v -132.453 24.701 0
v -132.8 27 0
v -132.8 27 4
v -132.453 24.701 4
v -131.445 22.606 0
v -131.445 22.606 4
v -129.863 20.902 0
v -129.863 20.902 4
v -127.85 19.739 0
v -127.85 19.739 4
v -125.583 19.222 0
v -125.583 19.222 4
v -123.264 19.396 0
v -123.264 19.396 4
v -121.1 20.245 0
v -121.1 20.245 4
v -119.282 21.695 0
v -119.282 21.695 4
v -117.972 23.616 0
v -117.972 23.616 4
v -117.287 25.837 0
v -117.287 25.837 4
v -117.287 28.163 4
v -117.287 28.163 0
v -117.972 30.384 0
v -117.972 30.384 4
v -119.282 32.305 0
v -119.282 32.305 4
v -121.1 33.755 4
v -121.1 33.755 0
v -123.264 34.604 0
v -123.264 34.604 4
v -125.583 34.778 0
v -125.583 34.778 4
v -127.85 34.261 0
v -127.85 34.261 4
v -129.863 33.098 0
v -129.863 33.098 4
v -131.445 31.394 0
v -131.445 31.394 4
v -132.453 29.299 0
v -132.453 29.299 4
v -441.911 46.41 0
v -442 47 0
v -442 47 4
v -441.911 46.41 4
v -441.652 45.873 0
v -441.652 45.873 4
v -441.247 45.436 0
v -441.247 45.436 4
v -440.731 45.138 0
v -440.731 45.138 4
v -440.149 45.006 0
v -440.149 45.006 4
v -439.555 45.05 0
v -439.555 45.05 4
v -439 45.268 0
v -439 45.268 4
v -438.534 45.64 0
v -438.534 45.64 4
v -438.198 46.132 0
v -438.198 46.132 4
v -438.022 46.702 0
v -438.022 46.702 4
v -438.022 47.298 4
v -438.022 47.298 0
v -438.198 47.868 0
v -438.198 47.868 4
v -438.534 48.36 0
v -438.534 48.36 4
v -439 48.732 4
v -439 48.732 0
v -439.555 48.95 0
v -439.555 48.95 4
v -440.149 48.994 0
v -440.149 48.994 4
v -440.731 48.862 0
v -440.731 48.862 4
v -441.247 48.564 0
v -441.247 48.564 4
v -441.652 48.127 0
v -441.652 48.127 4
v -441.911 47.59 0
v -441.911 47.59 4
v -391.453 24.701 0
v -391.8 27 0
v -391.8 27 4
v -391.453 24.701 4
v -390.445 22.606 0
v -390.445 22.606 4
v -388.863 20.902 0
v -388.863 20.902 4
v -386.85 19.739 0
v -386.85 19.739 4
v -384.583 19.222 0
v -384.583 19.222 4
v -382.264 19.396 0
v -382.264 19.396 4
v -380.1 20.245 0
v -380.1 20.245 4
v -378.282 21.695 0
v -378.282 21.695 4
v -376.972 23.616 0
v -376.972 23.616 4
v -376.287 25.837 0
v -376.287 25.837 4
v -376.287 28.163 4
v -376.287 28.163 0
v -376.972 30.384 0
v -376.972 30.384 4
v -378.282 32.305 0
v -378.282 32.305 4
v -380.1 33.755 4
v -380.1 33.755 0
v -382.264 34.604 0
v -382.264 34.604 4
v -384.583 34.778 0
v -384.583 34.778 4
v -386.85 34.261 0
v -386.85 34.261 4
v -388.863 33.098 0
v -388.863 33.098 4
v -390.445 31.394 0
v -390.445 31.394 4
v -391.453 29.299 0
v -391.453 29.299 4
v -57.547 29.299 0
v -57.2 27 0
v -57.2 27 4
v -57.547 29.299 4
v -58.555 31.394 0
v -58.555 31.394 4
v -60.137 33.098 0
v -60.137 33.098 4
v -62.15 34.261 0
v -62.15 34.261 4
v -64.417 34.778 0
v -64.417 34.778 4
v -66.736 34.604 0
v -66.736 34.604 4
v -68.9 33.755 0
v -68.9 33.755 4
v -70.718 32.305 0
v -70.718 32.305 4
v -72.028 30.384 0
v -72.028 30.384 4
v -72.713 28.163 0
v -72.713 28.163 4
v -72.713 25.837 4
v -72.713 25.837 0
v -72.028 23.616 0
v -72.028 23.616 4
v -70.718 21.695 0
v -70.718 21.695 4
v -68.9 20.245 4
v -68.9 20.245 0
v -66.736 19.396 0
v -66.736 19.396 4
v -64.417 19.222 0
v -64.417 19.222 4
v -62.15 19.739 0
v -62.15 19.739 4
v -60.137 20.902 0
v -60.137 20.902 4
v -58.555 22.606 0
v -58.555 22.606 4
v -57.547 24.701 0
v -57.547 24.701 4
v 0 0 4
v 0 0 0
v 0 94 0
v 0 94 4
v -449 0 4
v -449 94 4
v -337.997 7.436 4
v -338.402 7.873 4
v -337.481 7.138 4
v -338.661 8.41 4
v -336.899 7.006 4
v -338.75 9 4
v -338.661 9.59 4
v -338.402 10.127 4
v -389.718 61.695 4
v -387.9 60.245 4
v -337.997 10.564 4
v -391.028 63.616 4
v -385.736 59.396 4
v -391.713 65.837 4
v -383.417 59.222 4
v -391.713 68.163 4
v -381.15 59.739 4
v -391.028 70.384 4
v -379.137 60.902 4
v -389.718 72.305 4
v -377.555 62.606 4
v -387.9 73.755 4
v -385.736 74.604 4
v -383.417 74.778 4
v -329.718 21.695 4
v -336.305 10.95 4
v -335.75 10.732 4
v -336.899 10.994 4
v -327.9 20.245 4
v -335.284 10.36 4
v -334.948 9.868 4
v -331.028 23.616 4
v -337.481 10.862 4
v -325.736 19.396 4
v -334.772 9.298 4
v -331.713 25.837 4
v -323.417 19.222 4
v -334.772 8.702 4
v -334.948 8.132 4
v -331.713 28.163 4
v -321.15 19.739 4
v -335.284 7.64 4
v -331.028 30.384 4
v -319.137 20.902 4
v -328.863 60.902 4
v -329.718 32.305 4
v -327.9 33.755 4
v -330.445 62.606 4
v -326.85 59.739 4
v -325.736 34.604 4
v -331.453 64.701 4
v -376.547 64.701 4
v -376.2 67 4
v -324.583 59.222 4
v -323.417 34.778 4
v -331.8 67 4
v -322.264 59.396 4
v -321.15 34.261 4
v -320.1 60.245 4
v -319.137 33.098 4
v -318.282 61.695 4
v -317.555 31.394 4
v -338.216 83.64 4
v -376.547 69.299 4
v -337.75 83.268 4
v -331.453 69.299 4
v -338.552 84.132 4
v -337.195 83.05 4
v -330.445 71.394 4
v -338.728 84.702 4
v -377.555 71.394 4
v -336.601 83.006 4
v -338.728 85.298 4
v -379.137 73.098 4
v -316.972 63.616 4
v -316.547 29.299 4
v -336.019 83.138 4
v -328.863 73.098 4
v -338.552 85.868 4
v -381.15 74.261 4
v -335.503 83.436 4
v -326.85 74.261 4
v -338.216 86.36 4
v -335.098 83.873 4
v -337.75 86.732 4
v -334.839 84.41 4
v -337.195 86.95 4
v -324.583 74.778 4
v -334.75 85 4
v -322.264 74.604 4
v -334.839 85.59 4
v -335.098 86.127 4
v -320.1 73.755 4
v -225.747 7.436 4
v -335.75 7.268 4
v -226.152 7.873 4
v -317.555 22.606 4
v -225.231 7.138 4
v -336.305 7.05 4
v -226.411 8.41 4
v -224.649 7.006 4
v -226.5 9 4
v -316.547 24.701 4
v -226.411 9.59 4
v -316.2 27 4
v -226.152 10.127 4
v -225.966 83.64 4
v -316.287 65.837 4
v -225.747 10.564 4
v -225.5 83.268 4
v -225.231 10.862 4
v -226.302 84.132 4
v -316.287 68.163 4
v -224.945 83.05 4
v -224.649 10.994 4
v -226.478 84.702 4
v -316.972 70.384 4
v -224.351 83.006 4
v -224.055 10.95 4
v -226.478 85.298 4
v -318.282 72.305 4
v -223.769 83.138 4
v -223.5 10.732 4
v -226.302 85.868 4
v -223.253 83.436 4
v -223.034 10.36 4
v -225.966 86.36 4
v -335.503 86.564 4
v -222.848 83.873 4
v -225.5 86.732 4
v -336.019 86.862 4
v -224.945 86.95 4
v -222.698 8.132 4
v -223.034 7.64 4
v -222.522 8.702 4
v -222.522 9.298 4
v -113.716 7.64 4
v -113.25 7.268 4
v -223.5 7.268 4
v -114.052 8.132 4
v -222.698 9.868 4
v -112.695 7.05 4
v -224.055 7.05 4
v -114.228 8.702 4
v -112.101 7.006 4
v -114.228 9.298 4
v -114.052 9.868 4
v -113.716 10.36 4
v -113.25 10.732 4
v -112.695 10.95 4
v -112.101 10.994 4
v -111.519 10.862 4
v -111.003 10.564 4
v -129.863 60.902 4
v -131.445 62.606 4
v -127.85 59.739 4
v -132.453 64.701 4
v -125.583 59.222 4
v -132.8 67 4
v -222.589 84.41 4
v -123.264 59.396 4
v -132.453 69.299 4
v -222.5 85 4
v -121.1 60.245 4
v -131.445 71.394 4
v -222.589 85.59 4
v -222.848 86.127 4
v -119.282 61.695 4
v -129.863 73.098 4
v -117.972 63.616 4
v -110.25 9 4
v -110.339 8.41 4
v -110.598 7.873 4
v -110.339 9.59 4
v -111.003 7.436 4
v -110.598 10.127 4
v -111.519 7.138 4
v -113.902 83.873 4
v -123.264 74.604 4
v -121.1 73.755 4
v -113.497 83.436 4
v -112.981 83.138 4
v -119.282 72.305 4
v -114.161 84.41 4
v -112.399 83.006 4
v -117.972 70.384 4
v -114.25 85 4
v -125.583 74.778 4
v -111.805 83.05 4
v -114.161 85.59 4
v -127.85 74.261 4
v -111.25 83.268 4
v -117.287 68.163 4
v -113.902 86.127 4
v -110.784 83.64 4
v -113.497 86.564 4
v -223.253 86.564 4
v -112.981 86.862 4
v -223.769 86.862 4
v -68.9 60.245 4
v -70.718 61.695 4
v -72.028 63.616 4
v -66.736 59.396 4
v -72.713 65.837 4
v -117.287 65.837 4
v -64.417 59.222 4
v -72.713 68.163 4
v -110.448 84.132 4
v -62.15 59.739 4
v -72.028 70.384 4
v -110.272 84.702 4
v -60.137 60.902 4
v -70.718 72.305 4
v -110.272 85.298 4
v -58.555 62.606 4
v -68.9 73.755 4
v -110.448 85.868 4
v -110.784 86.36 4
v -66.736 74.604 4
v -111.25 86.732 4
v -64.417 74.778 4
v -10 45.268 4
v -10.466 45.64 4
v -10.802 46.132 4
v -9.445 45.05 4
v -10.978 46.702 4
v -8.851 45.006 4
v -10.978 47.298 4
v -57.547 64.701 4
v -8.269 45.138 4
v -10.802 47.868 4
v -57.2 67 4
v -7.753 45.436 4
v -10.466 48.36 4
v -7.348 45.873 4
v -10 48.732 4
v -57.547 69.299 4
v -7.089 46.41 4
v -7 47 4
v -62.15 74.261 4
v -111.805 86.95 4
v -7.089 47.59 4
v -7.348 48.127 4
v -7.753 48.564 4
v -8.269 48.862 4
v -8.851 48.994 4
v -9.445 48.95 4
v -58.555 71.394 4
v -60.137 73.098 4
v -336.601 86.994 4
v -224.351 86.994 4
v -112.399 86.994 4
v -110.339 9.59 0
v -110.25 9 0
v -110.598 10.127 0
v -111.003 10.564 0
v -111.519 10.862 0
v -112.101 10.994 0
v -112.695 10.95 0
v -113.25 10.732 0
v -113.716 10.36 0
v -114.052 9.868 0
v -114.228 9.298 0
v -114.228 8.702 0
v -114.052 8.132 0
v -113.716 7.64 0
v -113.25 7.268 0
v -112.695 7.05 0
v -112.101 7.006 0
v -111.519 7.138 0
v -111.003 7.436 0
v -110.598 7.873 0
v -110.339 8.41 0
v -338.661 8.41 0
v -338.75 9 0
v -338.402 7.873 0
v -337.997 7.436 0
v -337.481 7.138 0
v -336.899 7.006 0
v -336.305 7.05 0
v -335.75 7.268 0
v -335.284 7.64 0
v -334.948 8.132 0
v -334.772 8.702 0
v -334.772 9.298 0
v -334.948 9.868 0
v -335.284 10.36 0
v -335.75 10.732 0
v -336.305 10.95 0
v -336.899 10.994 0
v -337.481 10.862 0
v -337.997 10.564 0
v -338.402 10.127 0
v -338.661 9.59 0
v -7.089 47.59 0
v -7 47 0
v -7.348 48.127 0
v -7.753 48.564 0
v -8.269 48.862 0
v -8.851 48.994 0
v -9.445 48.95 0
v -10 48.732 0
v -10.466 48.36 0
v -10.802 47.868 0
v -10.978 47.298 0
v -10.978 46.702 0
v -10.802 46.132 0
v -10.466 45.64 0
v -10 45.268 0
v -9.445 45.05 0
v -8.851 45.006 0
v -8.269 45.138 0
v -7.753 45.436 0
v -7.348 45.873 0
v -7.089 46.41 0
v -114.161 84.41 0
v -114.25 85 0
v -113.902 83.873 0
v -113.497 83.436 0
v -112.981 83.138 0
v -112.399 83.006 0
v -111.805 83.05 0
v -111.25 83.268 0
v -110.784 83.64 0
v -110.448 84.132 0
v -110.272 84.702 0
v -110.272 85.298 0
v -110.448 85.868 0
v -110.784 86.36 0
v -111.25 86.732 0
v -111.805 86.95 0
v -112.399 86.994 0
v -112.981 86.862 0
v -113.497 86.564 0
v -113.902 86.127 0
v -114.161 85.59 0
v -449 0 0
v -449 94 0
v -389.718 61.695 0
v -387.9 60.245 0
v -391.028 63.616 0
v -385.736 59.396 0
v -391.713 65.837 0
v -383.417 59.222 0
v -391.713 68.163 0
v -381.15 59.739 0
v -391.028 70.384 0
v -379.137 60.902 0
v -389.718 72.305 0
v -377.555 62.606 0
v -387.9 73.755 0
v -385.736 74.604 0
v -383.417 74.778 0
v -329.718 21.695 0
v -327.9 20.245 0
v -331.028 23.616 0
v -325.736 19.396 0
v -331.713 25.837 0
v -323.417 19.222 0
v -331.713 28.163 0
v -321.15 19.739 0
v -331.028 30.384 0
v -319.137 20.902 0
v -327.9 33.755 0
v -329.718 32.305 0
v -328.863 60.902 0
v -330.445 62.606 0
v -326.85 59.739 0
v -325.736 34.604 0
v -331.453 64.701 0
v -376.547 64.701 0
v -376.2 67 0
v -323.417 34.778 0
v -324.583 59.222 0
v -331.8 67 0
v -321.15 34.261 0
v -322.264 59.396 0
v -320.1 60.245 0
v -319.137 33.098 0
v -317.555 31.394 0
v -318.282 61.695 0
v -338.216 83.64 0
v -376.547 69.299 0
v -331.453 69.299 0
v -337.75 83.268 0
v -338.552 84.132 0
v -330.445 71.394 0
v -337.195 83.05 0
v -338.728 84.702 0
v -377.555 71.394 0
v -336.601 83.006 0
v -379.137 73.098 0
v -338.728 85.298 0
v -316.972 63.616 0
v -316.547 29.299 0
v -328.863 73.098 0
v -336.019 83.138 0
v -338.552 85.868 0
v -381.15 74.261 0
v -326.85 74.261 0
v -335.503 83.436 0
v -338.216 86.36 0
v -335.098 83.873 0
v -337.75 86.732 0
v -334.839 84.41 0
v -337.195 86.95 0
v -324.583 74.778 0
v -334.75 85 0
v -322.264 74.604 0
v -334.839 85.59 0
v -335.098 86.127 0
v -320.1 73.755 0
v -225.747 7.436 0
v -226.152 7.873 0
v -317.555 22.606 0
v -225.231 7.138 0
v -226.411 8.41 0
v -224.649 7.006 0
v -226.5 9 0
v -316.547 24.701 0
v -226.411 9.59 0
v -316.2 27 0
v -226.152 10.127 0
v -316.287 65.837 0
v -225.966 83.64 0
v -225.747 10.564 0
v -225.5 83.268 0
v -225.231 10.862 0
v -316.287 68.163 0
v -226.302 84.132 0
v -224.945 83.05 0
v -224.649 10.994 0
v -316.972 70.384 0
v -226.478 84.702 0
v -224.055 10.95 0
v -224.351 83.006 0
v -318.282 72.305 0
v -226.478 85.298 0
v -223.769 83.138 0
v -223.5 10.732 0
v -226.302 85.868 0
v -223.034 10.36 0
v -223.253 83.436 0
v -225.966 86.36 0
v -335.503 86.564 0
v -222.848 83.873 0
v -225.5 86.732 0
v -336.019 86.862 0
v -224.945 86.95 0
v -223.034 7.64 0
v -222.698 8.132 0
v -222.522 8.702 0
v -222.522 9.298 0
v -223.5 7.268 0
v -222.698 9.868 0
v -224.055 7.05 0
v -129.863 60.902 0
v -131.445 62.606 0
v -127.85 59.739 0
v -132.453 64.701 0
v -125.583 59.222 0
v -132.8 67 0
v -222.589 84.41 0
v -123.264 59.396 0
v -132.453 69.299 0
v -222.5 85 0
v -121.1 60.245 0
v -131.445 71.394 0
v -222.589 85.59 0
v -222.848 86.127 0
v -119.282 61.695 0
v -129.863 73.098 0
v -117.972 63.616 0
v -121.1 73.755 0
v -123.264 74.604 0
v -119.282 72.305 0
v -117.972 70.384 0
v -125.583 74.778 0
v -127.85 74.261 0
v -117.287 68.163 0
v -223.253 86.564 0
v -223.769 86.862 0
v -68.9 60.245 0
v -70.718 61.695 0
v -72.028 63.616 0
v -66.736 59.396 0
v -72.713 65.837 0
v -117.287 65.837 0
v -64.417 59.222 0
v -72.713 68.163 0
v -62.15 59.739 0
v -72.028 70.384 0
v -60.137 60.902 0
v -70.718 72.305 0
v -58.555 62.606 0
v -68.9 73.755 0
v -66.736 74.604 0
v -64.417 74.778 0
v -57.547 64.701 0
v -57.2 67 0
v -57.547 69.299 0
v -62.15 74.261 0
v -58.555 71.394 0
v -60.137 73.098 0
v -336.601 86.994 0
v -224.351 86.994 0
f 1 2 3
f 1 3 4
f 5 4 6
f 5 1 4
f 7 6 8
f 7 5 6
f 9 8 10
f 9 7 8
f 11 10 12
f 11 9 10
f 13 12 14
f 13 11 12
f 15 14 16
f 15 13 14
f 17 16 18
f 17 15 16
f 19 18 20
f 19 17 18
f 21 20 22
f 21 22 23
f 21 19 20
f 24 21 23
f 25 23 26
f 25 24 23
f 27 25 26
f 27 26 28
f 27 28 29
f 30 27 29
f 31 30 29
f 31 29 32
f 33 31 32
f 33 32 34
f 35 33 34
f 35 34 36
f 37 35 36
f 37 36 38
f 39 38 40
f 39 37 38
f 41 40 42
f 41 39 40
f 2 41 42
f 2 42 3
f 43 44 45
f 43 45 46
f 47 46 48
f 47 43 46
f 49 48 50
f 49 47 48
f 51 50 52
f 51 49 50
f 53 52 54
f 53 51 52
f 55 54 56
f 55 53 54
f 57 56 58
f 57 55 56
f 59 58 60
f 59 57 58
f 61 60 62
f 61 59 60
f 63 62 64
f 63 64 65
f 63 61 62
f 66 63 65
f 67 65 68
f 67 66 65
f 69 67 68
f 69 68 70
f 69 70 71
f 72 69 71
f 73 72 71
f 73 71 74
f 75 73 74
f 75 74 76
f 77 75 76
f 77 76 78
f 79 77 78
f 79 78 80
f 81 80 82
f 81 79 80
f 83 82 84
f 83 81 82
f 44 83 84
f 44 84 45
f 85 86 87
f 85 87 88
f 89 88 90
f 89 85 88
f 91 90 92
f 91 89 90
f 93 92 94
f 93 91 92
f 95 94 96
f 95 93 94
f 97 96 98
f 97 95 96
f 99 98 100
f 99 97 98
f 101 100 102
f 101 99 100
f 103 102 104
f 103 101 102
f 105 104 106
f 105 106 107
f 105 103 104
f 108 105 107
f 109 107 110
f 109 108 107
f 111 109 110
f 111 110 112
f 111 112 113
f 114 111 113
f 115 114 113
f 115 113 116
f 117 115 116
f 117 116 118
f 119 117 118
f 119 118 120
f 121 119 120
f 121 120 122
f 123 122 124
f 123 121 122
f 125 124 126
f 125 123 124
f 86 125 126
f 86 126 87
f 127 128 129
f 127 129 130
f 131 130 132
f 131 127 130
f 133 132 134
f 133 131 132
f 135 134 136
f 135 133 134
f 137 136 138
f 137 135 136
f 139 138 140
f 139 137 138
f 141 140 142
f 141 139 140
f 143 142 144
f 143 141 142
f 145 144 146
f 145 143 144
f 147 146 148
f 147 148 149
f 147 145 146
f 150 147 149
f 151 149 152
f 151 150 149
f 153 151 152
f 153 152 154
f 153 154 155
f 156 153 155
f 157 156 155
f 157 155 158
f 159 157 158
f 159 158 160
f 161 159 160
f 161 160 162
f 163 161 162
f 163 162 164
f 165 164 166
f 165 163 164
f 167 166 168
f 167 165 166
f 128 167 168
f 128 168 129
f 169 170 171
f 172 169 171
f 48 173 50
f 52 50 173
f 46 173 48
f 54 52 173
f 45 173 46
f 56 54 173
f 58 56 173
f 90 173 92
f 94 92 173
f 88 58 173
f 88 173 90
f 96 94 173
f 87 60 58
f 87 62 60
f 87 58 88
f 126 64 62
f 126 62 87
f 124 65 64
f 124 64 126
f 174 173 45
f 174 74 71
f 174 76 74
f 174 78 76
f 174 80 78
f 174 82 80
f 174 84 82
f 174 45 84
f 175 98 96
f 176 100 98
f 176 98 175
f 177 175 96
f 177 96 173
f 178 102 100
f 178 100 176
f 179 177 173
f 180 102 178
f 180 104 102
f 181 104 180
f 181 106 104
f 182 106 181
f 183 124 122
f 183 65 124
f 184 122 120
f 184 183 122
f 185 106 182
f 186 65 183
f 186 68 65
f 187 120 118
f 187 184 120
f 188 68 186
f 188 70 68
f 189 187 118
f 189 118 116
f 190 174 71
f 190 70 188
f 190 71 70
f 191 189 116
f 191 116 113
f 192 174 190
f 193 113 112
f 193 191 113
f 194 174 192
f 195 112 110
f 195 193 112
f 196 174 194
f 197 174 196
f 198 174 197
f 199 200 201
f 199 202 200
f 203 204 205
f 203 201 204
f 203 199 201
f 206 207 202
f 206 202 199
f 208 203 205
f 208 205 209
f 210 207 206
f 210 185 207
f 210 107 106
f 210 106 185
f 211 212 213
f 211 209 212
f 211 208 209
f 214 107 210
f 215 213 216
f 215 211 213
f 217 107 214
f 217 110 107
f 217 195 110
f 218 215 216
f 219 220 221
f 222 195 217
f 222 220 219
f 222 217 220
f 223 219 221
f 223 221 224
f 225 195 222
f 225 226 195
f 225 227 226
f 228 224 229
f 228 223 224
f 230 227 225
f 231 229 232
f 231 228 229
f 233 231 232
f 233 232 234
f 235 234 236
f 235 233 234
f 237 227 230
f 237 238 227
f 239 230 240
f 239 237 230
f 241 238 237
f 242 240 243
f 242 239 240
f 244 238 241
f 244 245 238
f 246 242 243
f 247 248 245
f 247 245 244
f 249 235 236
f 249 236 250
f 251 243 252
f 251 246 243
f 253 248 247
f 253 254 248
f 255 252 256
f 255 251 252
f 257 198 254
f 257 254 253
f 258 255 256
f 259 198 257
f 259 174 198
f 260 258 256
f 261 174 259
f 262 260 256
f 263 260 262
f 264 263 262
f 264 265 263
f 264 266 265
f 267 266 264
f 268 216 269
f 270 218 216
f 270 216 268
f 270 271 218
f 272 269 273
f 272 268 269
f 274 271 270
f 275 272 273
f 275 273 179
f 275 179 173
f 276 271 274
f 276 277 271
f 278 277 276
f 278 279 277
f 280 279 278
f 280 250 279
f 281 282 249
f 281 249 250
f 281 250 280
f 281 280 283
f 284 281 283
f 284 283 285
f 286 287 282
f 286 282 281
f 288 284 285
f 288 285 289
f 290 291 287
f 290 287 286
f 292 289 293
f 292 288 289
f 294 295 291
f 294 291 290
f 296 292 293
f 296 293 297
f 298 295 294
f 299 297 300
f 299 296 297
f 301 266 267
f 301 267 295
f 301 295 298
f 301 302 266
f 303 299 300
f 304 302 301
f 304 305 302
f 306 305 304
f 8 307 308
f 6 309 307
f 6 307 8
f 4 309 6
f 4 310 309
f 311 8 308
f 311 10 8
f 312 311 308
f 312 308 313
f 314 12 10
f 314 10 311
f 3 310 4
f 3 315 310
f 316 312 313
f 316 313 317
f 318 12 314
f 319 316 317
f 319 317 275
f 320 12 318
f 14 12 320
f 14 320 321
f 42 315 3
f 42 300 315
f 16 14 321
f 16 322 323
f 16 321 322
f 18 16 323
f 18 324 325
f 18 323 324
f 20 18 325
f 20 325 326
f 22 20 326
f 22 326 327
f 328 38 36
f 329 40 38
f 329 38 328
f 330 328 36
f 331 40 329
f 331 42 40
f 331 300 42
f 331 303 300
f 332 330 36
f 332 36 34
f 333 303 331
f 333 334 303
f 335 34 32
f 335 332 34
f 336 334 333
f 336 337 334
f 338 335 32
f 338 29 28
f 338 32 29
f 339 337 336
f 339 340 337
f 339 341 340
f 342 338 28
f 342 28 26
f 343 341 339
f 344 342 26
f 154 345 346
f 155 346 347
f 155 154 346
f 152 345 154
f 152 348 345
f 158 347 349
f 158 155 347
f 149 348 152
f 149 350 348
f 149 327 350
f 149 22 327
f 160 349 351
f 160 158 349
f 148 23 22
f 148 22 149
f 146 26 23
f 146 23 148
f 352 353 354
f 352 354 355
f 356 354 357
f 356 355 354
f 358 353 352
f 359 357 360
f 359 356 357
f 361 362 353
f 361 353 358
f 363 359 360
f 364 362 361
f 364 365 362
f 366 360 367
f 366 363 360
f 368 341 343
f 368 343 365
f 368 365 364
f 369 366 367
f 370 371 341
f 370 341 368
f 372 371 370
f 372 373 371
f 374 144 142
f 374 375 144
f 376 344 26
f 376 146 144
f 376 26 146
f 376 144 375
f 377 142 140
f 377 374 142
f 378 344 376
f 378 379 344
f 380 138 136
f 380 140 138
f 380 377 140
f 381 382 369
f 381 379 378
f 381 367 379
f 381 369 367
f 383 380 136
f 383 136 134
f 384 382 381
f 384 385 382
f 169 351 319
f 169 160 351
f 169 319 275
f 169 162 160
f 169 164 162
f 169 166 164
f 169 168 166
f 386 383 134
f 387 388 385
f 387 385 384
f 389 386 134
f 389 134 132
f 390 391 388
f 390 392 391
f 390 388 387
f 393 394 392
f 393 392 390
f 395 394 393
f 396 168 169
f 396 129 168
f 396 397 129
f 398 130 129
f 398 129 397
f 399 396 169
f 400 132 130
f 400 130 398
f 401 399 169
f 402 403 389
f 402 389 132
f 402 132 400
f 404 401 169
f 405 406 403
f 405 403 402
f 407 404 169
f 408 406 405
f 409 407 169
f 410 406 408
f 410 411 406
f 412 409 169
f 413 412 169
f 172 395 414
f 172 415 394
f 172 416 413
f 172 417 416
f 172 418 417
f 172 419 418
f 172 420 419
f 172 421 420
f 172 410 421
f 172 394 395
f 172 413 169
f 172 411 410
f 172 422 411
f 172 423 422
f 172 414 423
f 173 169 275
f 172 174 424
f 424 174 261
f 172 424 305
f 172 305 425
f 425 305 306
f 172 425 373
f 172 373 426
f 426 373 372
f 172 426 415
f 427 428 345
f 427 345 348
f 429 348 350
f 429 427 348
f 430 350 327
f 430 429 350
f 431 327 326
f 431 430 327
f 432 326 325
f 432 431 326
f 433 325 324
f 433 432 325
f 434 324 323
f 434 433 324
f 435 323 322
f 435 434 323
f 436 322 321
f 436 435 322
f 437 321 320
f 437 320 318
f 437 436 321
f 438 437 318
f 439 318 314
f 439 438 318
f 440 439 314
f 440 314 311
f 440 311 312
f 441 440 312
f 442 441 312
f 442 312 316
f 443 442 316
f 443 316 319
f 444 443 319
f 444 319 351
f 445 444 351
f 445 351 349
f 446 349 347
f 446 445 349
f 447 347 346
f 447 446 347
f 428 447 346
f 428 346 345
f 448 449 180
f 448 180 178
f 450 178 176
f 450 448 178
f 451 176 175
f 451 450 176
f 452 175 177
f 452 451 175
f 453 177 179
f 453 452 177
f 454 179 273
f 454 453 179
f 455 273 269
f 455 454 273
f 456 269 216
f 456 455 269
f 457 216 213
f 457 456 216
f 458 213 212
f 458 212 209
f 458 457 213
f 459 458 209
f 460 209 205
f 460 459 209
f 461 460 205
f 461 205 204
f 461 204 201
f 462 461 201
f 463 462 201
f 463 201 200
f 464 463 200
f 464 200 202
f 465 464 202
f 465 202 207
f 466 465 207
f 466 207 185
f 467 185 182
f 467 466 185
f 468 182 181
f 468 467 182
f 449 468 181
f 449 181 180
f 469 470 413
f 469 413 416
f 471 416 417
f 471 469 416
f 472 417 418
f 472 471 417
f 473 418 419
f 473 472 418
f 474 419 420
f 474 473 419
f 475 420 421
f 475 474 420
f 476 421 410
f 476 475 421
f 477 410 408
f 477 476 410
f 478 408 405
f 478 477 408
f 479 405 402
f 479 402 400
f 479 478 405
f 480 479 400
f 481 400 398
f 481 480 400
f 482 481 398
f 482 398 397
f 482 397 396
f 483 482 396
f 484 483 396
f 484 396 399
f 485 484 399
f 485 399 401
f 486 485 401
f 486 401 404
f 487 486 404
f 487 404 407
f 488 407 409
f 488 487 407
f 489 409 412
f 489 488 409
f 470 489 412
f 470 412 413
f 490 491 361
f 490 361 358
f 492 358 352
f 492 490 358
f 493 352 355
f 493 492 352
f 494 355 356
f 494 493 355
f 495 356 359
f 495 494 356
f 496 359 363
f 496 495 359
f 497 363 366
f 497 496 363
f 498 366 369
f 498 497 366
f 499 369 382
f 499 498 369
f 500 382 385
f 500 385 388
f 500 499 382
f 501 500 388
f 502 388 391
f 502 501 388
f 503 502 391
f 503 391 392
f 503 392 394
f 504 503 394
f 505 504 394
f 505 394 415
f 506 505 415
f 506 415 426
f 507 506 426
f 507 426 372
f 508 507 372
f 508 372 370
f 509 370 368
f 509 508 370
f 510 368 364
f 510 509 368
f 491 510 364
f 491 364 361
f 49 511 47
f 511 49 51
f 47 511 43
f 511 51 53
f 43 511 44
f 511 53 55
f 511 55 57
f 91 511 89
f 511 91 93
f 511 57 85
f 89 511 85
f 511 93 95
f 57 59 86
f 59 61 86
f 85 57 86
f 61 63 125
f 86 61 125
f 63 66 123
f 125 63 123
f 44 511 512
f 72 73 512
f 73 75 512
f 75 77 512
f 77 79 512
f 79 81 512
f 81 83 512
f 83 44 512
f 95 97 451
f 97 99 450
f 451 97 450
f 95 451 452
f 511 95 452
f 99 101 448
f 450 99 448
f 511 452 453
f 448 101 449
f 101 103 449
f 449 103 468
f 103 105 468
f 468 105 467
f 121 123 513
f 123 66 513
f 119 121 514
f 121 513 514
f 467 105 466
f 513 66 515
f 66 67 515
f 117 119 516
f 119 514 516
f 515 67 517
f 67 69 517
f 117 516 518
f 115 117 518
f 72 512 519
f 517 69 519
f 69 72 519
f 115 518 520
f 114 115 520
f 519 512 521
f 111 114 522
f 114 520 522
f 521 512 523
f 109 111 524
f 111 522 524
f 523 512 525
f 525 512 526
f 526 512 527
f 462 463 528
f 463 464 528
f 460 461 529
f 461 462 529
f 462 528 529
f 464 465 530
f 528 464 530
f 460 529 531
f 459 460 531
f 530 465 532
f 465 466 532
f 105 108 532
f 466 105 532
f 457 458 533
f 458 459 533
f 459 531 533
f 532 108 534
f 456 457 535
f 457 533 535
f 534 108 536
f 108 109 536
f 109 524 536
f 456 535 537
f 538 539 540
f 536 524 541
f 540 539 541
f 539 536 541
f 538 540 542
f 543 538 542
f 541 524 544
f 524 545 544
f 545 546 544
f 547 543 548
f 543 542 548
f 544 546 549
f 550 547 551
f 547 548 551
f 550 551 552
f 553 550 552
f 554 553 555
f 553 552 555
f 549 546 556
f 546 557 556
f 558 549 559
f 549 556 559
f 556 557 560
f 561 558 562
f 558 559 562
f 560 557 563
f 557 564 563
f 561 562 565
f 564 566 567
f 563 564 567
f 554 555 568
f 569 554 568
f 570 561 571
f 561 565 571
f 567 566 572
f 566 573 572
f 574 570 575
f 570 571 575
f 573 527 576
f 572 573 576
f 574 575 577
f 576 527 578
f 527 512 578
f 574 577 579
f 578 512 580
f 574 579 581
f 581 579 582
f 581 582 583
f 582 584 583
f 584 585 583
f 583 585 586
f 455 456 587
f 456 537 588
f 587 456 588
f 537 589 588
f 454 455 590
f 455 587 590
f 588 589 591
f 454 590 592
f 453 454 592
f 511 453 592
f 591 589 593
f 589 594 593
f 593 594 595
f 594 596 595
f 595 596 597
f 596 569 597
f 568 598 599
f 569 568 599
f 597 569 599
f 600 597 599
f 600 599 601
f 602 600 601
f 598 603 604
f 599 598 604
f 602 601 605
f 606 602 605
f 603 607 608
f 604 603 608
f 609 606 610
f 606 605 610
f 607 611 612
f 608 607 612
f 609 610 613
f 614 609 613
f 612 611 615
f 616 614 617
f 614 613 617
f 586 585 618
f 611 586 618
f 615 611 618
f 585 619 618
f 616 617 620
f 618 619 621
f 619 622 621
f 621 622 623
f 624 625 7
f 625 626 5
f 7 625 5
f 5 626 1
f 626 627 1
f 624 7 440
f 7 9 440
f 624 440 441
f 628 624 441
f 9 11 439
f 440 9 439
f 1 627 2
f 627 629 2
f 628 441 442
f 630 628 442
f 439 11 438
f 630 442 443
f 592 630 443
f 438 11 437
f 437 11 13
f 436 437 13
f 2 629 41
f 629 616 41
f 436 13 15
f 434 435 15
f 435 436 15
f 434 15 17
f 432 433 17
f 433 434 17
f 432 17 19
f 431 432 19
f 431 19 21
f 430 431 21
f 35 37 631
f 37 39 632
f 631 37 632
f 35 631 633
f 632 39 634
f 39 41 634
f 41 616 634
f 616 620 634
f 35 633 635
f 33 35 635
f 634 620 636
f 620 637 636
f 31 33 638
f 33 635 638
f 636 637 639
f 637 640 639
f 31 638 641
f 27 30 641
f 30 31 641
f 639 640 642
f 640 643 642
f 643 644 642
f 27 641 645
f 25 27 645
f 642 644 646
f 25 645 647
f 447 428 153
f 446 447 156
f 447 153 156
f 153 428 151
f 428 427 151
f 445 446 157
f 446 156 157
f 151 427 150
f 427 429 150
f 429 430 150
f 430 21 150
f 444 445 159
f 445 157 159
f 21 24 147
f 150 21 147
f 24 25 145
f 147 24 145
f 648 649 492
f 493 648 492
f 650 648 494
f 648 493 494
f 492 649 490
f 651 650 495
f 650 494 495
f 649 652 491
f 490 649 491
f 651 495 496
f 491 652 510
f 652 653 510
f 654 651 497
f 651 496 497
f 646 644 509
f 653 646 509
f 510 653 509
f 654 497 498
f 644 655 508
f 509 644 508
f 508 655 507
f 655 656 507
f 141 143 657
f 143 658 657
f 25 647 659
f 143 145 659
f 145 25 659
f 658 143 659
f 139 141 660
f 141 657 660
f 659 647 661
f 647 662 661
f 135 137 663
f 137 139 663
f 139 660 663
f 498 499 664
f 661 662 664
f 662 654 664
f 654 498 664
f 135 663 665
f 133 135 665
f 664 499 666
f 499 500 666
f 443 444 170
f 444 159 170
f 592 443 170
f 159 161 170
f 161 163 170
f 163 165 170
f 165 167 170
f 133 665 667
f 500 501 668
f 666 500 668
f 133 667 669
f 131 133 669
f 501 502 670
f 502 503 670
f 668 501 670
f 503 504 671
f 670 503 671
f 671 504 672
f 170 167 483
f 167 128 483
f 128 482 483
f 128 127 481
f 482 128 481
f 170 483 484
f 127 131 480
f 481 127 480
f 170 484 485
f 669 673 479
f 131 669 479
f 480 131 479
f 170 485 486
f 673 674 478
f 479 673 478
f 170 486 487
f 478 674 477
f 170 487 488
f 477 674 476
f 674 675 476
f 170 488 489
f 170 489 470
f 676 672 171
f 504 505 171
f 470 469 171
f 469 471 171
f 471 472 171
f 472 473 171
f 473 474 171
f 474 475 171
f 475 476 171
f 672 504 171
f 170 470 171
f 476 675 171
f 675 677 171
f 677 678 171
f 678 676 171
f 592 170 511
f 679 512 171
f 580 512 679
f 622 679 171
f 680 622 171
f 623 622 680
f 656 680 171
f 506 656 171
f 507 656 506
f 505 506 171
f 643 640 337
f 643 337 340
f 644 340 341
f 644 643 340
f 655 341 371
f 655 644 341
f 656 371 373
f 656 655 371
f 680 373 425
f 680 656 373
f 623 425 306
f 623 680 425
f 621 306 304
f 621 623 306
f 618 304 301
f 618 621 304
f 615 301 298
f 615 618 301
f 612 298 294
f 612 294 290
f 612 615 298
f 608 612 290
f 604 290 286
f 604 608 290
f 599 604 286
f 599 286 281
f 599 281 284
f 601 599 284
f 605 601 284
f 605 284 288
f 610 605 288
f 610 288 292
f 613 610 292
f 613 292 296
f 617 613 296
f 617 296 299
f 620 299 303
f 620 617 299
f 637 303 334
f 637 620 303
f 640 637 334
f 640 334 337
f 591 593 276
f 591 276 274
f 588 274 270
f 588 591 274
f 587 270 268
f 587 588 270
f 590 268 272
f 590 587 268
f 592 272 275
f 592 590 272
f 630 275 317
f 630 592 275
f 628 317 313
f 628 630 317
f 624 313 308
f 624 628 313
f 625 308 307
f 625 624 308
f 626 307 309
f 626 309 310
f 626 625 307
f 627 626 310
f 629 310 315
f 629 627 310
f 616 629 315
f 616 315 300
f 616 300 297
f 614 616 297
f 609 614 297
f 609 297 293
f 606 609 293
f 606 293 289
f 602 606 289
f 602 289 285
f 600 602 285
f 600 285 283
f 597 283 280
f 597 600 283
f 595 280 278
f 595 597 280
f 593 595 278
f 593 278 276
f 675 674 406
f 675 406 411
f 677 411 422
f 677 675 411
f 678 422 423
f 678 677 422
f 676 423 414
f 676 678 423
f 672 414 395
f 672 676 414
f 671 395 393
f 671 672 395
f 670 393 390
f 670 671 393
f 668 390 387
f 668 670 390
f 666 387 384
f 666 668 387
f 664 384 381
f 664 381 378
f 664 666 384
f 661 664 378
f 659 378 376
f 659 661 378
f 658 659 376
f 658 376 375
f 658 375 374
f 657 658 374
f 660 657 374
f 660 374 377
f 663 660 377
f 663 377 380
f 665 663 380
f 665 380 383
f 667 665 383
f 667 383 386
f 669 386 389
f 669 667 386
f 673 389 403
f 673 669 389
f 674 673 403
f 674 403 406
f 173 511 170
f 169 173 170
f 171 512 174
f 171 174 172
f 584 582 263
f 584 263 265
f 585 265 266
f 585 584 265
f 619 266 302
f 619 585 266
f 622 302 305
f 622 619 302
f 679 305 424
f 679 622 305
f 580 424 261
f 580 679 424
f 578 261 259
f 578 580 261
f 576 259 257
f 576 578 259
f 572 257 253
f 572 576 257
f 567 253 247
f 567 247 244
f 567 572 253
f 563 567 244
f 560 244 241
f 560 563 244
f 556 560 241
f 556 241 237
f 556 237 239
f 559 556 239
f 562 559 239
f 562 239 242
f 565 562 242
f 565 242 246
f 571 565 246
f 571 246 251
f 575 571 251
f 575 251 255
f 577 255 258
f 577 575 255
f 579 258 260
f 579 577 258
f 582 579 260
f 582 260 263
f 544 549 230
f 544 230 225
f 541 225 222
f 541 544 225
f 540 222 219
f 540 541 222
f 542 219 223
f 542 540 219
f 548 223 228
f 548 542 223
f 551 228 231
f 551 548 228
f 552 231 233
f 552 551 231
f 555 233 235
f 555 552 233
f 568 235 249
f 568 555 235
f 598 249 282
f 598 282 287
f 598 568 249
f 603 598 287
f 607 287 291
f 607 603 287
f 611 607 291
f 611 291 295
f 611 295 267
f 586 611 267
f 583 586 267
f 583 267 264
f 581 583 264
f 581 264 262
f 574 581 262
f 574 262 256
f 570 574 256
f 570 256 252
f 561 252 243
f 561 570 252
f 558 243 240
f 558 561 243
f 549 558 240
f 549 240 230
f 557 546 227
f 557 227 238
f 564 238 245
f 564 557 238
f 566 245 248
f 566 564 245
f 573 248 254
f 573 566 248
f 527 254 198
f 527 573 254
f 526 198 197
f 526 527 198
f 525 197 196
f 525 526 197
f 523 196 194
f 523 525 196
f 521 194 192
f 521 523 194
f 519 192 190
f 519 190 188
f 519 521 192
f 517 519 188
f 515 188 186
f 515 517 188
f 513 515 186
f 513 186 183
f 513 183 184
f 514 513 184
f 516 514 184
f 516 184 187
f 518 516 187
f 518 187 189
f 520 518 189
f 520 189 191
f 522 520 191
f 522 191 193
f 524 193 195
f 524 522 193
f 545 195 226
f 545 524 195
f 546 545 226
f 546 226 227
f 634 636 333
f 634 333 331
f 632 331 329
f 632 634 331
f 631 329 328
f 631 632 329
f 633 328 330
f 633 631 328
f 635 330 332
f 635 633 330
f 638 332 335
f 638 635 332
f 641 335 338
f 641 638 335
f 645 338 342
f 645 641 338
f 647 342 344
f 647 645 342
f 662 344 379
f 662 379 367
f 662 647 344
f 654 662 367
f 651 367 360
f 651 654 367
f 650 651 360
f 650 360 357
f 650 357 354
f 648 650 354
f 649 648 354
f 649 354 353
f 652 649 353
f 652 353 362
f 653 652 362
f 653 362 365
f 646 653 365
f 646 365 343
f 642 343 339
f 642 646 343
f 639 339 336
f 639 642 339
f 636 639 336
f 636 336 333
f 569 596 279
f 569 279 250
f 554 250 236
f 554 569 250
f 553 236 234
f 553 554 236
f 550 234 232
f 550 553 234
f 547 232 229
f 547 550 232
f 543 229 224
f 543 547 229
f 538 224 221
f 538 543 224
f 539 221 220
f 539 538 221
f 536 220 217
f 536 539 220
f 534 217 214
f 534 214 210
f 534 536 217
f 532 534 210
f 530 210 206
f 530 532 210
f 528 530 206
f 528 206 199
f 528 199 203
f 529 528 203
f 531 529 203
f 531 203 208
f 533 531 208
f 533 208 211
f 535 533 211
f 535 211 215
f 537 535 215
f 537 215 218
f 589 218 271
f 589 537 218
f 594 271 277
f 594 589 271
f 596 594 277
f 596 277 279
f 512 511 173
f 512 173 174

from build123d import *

# Parameters (mm, degrees)
SCHIZZO1_W                   = 449
SCHIZZO1_H                   = 94
SCHIZZO1_R                   = 7.8
SCHIZZO1_R_2                 = 2
ESTRUSIONE_ESTRUSIONE1_DEPTH = 4


with BuildPart() as part:
    # Schizzo1 → Estrusione-Estrusione1 (new body)
    with BuildSketch(Plane.XY):
        with Locations((-224.5, 47)):
            Rectangle(SCHIZZO1_W, SCHIZZO1_H)
        with Locations(Location((-384, 27, 0), (0, 0, 180))):
            Circle(SCHIZZO1_R, mode=Mode.SUBTRACT)
        with Locations((-9, 47)):
            Circle(SCHIZZO1_R_2, mode=Mode.SUBTRACT)
        with Locations((-224.5, 85)):
            Circle(SCHIZZO1_R_2, mode=Mode.SUBTRACT)
        with Locations(Location((-440, 47, 0), (0, 0, 180))):
            Circle(SCHIZZO1_R_2, mode=Mode.SUBTRACT)
        with Locations(Location((-224.5, 9, 0), (0, 0, 180))):
            Circle(SCHIZZO1_R_2, mode=Mode.SUBTRACT)
        with Locations((-324, 27)):
            Circle(SCHIZZO1_R, mode=Mode.SUBTRACT)
        with Locations(Location((-324, 67, 0), (0, 0, 180))):
            Circle(SCHIZZO1_R, mode=Mode.SUBTRACT)
        with Locations((-336.75, 85)):
            Circle(SCHIZZO1_R_2, mode=Mode.SUBTRACT)
        with Locations((-384, 67)):
            Circle(SCHIZZO1_R, mode=Mode.SUBTRACT)
        with Locations(Location((-336.75, 9, 0), (0, 0, 180))):
            Circle(SCHIZZO1_R_2, mode=Mode.SUBTRACT)
        with Locations((-112.25, 9)):
            Circle(SCHIZZO1_R_2, mode=Mode.SUBTRACT)
        with Locations(Location((-112.25, 85, 0), (0, 0, 180))):
            Circle(SCHIZZO1_R_2, mode=Mode.SUBTRACT)
        with Locations((-65, 67)):
            Circle(SCHIZZO1_R, mode=Mode.SUBTRACT)
        with Locations((-65, 27)):
            Circle(SCHIZZO1_R, mode=Mode.SUBTRACT)
        with Locations(Location((-125, 27, 0), (0, 0, 180))):
            Circle(SCHIZZO1_R, mode=Mode.SUBTRACT)
        with Locations(Location((-125, 67, 0), (0, 0, 180))):
            Circle(SCHIZZO1_R, mode=Mode.SUBTRACT)
    extrude(amount=ESTRUSIONE_ESTRUSIONE1_DEPTH)


solid = part.part
